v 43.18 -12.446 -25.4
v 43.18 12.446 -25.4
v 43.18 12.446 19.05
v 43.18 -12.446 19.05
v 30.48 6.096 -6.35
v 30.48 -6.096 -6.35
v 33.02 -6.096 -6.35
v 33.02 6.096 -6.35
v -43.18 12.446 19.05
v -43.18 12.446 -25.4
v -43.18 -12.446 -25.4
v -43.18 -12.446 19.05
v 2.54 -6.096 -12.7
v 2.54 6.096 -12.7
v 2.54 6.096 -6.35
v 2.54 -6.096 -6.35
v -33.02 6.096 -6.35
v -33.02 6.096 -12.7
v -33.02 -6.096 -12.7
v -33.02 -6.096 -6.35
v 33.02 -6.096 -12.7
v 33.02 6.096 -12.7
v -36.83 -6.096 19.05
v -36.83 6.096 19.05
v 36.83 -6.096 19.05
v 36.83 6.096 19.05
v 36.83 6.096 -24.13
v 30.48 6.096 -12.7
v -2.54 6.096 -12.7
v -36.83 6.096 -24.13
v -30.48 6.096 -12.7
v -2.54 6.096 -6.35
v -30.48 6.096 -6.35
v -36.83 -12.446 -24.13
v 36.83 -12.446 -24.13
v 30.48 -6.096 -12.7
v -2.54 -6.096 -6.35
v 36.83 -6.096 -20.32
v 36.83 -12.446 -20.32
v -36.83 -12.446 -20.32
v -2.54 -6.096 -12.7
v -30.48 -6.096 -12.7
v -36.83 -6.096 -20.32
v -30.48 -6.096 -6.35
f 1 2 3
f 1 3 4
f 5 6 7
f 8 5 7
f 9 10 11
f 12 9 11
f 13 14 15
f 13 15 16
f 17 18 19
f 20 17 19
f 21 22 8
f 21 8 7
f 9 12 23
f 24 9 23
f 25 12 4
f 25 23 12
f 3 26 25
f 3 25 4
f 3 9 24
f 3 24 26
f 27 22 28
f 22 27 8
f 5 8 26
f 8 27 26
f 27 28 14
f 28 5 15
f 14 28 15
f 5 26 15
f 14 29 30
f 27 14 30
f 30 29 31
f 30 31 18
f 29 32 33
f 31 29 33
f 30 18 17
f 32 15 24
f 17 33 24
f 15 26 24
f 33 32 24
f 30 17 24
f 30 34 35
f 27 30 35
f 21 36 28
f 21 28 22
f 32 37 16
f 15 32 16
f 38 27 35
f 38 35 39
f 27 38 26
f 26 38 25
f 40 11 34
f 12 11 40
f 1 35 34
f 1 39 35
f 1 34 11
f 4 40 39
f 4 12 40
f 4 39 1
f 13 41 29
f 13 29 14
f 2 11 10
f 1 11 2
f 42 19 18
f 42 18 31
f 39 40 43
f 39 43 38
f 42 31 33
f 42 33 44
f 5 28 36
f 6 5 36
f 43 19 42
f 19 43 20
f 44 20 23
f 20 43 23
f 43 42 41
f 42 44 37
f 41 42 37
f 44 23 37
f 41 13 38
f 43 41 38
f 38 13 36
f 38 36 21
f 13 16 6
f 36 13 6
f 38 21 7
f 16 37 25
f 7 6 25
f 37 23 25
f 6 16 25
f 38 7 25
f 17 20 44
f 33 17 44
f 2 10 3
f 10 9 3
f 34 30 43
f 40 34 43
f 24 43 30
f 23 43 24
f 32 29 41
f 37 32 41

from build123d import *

# Parameters (mm, degrees)
F0_W        = 86.36
F0_H        = 24.892
F0_W_2      = 73.66
F0_H_2      = 12.192
F1_DEPTH    = 19.05
F1_FACE_W   = 86.36
F1_FACE_H   = 24.892
F1_FACE_W_2 = 73.66
F1_FACE_H_2 = 12.192
F2_DEPTH    = 12.7
F3_W        = 2.54
F3_H        = 12.192
F3_W_2      = 5.08
F4_DEPTH    = 6.35
F3_W_3      = 86.36
F3_H_2      = 24.892
F5_DEPTH    = 12.7
F7_W        = 73.66
F7_H        = 12.192
F8_DEPTH    = 2.54
F6_W        = 73.66
F6_H        = 3.81
F9_DEPTH    = 18.542


with BuildPart() as f1:
    # F0 (on Top) → F1 (new body)
    with BuildSketch(Plane.XY):
        Rectangle(F0_W, F0_H)
        Rectangle(F0_W_2, F0_H_2, mode=Mode.SUBTRACT)
    extrude(amount=F1_DEPTH)

    # F1_face (on face) → F2 (join)
    with BuildSketch(Plane(origin=(0, 0, 0), x_dir=(1, 0, 0), z_dir=(0, 0, -1))):
        Rectangle(F1_FACE_W, F1_FACE_H)
        Rectangle(F1_FACE_W_2, F1_FACE_H_2, mode=Mode.SUBTRACT)
    extrude(amount=F2_DEPTH)

    # F3 (on face) → F4 (join)
    with BuildSketch(Plane(origin=(0, 0, -12.7), x_dir=(1, 0, 0), z_dir=(0, 0, -1))):
        with Locations((-31.75, 0)):
            Rectangle(F3_W, F3_H)
        Rectangle(F3_W_2, F3_H)
        with Locations((31.75, 0)):
            Rectangle(F3_W, F3_H)
    extrude(amount=-F4_DEPTH)

    # F3 (on face) → F5 (join)
    with BuildSketch(Plane(origin=(0, 0, -12.7), x_dir=(1, 0, 0), z_dir=(0, 0, -1))):
        Rectangle(F3_W_3, F3_H_2)
        Polygon((-2.54, 6.096), (2.54, 6.096), (30.48, 6.096), (33.02, 6.096), (36.83, 6.096), (36.83, -6.096), (33.02, -6.096), (30.48, -6.096), (2.54, -6.096), (-2.54, -6.096), (-30.48, -6.096), (-33.02, -6.096), (-36.83, -6.096), (-36.83, 6.096), (-33.02, 6.096), (-30.48, 6.096), align=None, mode=Mode.SUBTRACT)
    extrude(amount=F5_DEPTH)

    # F7 (on face) → F8 (join)
    with BuildSketch(Plane(origin=(0, 0, -25.4), x_dir=(1, 0, 0), z_dir=(0, 0, -1))):
        Rectangle(F7_W, F7_H)
    extrude(amount=-F8_DEPTH)

    # F6 (on face) → F9 (cut)
    with BuildSketch(Plane.XZ.offset(12.446)):
        with Locations((0, -22.225)):
            Rectangle(F6_W, F6_H)
    extrude(amount=-F9_DEPTH, mode=Mode.SUBTRACT)


solid = f1.part
